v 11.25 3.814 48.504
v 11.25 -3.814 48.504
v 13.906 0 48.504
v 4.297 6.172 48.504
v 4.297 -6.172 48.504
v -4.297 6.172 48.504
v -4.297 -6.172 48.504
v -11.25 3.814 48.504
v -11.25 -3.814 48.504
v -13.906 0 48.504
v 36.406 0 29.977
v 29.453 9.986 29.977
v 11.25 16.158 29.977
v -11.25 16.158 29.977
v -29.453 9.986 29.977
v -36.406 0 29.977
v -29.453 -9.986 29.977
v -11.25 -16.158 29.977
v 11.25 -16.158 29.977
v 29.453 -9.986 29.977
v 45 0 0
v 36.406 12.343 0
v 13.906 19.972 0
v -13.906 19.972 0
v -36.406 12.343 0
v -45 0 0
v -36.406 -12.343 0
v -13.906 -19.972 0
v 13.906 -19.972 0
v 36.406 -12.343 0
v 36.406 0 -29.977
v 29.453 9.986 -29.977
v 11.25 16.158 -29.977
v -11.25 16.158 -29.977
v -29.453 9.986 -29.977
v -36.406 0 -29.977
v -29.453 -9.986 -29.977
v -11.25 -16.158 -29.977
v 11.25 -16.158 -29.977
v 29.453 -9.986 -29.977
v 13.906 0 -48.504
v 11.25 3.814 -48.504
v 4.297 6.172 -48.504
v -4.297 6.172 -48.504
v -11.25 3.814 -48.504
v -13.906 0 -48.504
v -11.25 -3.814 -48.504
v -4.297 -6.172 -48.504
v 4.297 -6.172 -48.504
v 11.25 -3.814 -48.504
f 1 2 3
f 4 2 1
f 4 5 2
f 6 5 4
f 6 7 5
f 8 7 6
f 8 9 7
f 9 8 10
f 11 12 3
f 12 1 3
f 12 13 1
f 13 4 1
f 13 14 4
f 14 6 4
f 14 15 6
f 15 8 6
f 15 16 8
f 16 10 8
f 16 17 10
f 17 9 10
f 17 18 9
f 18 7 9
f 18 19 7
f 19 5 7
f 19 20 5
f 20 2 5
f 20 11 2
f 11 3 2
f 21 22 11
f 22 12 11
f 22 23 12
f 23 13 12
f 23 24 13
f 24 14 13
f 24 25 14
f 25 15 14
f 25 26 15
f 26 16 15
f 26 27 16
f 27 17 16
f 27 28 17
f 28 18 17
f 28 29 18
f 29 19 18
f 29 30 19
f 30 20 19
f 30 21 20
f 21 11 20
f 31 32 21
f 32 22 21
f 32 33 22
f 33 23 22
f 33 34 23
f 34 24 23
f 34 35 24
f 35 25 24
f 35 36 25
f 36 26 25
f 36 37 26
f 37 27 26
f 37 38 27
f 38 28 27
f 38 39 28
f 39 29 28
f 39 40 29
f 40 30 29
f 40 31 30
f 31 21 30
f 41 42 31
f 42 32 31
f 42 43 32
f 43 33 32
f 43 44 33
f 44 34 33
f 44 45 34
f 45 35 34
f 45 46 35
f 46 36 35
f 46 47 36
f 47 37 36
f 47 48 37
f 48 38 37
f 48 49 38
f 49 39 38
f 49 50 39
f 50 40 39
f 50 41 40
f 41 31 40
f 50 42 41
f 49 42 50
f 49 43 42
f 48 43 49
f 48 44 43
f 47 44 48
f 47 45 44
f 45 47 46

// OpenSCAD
// Generated by SolidPython 1.0.1 on 2020-07-29 00:46:51


scale(v = [15, 7, 17]) {
	sphere(r = 3);
}
/***********************************************
*********      SolidPython code:      **********
************************************************
 
# import packages: SolidPython
from solid import *
from solid.utils import *
from itertools import chain, combinations, permutations


class Resize:

    def __init__(self, scad_file):
        self.scad_file = scad_file
        #self.scad_file = import_scad(scad_file)
        # cone/cylinder param:
        self.r1 = 0
        self.r2 = 0
        self.h = 0
        # rectangular prism param:
        self.w = 0
        self.l = 0
        # ellipse param:
        self.r = 0

    # import OpenScad code (file name corresponds to shape)


    # classify shape + parameters
    def assign(self, param1, param2, param3):
        if self.scad_file == 'cone.scad':
            self.r1 = param1
            self.r2 = param2
            self.h = param3
        elif self.scad_file == 'cylinder.scad':
            self.r1 = param1
            self.r2 = param2
            self.h = param3
        elif self.scad_file == 'rectangularPrism.scad':
            self.h = param1
            self.l = param2
            self.w = param3
        else:
            self.r = param1
            self.h = param2

    # resize parameters
    def iterate(self):
        x = range(3, 20, 2)
        i = 1
        if self.scad_file == 'cone.scad':
            tempList = list(permutations(x, 2))
            for temp in tempList:
                param1 = temp[0]
                param2 = temp[1]
                filepath = 'produced_scad_files/' + 'cone' + str(param1) + '_' + str(param2) + '_' + '.scad'
                scad_render_to_file(cylinder(h=param1, r1=param2, r2=0), filepath)

        elif self.scad_file == 'cylinder.scad':
            tempList = list(permutations(x, 3))
            for temp in tempList:
                param1 = temp[0]
                param2 = temp[1]
                filepath = 'produced_scad_files/' + 'cylinder' + str(param1) + '_' + str(param2) + '_' + '.scad'
                scad_render_to_file(cylinder(h=param1, r1=param2, r2=param2), filepath)

        elif self.scad_file == 'rectangularPrism.scad':
            tempList = list(permutations(x, 3))
            for temp in tempList:
                param1 = temp[0]
                param2 = temp[1]
                param3 = temp[2]
                filepath = 'produced_scad_files/' + 'rectangularPrism' + str(param1) + '_' + str(param2) + '_' + str(
                    param3) + '.scad'
                scad_render_to_file(cube(size=(param1, param2, param3)), filepath)

        elif self.scad_file == 'ellipse.scad':
            tempList = list(permutations(x, 4))
            for temp in tempList:
                param1 = temp[0]
                param2 = temp[1]
                param3 = temp[2]
                param4 = temp[3]
                filepath = 'produced_scad_files/' + 'ellipse' + str(param1) + '_' + str(param2) + '_' + str(param3) + '_' + str(param4) + '.scad'
                scad_render_to_file(scale([param1, param2, param3])(sphere(r=param4)), filepath)

    def render_to_scadfile(self):
        scad_render_to_file(scad, 'example.scad') 
 
************************************************/
